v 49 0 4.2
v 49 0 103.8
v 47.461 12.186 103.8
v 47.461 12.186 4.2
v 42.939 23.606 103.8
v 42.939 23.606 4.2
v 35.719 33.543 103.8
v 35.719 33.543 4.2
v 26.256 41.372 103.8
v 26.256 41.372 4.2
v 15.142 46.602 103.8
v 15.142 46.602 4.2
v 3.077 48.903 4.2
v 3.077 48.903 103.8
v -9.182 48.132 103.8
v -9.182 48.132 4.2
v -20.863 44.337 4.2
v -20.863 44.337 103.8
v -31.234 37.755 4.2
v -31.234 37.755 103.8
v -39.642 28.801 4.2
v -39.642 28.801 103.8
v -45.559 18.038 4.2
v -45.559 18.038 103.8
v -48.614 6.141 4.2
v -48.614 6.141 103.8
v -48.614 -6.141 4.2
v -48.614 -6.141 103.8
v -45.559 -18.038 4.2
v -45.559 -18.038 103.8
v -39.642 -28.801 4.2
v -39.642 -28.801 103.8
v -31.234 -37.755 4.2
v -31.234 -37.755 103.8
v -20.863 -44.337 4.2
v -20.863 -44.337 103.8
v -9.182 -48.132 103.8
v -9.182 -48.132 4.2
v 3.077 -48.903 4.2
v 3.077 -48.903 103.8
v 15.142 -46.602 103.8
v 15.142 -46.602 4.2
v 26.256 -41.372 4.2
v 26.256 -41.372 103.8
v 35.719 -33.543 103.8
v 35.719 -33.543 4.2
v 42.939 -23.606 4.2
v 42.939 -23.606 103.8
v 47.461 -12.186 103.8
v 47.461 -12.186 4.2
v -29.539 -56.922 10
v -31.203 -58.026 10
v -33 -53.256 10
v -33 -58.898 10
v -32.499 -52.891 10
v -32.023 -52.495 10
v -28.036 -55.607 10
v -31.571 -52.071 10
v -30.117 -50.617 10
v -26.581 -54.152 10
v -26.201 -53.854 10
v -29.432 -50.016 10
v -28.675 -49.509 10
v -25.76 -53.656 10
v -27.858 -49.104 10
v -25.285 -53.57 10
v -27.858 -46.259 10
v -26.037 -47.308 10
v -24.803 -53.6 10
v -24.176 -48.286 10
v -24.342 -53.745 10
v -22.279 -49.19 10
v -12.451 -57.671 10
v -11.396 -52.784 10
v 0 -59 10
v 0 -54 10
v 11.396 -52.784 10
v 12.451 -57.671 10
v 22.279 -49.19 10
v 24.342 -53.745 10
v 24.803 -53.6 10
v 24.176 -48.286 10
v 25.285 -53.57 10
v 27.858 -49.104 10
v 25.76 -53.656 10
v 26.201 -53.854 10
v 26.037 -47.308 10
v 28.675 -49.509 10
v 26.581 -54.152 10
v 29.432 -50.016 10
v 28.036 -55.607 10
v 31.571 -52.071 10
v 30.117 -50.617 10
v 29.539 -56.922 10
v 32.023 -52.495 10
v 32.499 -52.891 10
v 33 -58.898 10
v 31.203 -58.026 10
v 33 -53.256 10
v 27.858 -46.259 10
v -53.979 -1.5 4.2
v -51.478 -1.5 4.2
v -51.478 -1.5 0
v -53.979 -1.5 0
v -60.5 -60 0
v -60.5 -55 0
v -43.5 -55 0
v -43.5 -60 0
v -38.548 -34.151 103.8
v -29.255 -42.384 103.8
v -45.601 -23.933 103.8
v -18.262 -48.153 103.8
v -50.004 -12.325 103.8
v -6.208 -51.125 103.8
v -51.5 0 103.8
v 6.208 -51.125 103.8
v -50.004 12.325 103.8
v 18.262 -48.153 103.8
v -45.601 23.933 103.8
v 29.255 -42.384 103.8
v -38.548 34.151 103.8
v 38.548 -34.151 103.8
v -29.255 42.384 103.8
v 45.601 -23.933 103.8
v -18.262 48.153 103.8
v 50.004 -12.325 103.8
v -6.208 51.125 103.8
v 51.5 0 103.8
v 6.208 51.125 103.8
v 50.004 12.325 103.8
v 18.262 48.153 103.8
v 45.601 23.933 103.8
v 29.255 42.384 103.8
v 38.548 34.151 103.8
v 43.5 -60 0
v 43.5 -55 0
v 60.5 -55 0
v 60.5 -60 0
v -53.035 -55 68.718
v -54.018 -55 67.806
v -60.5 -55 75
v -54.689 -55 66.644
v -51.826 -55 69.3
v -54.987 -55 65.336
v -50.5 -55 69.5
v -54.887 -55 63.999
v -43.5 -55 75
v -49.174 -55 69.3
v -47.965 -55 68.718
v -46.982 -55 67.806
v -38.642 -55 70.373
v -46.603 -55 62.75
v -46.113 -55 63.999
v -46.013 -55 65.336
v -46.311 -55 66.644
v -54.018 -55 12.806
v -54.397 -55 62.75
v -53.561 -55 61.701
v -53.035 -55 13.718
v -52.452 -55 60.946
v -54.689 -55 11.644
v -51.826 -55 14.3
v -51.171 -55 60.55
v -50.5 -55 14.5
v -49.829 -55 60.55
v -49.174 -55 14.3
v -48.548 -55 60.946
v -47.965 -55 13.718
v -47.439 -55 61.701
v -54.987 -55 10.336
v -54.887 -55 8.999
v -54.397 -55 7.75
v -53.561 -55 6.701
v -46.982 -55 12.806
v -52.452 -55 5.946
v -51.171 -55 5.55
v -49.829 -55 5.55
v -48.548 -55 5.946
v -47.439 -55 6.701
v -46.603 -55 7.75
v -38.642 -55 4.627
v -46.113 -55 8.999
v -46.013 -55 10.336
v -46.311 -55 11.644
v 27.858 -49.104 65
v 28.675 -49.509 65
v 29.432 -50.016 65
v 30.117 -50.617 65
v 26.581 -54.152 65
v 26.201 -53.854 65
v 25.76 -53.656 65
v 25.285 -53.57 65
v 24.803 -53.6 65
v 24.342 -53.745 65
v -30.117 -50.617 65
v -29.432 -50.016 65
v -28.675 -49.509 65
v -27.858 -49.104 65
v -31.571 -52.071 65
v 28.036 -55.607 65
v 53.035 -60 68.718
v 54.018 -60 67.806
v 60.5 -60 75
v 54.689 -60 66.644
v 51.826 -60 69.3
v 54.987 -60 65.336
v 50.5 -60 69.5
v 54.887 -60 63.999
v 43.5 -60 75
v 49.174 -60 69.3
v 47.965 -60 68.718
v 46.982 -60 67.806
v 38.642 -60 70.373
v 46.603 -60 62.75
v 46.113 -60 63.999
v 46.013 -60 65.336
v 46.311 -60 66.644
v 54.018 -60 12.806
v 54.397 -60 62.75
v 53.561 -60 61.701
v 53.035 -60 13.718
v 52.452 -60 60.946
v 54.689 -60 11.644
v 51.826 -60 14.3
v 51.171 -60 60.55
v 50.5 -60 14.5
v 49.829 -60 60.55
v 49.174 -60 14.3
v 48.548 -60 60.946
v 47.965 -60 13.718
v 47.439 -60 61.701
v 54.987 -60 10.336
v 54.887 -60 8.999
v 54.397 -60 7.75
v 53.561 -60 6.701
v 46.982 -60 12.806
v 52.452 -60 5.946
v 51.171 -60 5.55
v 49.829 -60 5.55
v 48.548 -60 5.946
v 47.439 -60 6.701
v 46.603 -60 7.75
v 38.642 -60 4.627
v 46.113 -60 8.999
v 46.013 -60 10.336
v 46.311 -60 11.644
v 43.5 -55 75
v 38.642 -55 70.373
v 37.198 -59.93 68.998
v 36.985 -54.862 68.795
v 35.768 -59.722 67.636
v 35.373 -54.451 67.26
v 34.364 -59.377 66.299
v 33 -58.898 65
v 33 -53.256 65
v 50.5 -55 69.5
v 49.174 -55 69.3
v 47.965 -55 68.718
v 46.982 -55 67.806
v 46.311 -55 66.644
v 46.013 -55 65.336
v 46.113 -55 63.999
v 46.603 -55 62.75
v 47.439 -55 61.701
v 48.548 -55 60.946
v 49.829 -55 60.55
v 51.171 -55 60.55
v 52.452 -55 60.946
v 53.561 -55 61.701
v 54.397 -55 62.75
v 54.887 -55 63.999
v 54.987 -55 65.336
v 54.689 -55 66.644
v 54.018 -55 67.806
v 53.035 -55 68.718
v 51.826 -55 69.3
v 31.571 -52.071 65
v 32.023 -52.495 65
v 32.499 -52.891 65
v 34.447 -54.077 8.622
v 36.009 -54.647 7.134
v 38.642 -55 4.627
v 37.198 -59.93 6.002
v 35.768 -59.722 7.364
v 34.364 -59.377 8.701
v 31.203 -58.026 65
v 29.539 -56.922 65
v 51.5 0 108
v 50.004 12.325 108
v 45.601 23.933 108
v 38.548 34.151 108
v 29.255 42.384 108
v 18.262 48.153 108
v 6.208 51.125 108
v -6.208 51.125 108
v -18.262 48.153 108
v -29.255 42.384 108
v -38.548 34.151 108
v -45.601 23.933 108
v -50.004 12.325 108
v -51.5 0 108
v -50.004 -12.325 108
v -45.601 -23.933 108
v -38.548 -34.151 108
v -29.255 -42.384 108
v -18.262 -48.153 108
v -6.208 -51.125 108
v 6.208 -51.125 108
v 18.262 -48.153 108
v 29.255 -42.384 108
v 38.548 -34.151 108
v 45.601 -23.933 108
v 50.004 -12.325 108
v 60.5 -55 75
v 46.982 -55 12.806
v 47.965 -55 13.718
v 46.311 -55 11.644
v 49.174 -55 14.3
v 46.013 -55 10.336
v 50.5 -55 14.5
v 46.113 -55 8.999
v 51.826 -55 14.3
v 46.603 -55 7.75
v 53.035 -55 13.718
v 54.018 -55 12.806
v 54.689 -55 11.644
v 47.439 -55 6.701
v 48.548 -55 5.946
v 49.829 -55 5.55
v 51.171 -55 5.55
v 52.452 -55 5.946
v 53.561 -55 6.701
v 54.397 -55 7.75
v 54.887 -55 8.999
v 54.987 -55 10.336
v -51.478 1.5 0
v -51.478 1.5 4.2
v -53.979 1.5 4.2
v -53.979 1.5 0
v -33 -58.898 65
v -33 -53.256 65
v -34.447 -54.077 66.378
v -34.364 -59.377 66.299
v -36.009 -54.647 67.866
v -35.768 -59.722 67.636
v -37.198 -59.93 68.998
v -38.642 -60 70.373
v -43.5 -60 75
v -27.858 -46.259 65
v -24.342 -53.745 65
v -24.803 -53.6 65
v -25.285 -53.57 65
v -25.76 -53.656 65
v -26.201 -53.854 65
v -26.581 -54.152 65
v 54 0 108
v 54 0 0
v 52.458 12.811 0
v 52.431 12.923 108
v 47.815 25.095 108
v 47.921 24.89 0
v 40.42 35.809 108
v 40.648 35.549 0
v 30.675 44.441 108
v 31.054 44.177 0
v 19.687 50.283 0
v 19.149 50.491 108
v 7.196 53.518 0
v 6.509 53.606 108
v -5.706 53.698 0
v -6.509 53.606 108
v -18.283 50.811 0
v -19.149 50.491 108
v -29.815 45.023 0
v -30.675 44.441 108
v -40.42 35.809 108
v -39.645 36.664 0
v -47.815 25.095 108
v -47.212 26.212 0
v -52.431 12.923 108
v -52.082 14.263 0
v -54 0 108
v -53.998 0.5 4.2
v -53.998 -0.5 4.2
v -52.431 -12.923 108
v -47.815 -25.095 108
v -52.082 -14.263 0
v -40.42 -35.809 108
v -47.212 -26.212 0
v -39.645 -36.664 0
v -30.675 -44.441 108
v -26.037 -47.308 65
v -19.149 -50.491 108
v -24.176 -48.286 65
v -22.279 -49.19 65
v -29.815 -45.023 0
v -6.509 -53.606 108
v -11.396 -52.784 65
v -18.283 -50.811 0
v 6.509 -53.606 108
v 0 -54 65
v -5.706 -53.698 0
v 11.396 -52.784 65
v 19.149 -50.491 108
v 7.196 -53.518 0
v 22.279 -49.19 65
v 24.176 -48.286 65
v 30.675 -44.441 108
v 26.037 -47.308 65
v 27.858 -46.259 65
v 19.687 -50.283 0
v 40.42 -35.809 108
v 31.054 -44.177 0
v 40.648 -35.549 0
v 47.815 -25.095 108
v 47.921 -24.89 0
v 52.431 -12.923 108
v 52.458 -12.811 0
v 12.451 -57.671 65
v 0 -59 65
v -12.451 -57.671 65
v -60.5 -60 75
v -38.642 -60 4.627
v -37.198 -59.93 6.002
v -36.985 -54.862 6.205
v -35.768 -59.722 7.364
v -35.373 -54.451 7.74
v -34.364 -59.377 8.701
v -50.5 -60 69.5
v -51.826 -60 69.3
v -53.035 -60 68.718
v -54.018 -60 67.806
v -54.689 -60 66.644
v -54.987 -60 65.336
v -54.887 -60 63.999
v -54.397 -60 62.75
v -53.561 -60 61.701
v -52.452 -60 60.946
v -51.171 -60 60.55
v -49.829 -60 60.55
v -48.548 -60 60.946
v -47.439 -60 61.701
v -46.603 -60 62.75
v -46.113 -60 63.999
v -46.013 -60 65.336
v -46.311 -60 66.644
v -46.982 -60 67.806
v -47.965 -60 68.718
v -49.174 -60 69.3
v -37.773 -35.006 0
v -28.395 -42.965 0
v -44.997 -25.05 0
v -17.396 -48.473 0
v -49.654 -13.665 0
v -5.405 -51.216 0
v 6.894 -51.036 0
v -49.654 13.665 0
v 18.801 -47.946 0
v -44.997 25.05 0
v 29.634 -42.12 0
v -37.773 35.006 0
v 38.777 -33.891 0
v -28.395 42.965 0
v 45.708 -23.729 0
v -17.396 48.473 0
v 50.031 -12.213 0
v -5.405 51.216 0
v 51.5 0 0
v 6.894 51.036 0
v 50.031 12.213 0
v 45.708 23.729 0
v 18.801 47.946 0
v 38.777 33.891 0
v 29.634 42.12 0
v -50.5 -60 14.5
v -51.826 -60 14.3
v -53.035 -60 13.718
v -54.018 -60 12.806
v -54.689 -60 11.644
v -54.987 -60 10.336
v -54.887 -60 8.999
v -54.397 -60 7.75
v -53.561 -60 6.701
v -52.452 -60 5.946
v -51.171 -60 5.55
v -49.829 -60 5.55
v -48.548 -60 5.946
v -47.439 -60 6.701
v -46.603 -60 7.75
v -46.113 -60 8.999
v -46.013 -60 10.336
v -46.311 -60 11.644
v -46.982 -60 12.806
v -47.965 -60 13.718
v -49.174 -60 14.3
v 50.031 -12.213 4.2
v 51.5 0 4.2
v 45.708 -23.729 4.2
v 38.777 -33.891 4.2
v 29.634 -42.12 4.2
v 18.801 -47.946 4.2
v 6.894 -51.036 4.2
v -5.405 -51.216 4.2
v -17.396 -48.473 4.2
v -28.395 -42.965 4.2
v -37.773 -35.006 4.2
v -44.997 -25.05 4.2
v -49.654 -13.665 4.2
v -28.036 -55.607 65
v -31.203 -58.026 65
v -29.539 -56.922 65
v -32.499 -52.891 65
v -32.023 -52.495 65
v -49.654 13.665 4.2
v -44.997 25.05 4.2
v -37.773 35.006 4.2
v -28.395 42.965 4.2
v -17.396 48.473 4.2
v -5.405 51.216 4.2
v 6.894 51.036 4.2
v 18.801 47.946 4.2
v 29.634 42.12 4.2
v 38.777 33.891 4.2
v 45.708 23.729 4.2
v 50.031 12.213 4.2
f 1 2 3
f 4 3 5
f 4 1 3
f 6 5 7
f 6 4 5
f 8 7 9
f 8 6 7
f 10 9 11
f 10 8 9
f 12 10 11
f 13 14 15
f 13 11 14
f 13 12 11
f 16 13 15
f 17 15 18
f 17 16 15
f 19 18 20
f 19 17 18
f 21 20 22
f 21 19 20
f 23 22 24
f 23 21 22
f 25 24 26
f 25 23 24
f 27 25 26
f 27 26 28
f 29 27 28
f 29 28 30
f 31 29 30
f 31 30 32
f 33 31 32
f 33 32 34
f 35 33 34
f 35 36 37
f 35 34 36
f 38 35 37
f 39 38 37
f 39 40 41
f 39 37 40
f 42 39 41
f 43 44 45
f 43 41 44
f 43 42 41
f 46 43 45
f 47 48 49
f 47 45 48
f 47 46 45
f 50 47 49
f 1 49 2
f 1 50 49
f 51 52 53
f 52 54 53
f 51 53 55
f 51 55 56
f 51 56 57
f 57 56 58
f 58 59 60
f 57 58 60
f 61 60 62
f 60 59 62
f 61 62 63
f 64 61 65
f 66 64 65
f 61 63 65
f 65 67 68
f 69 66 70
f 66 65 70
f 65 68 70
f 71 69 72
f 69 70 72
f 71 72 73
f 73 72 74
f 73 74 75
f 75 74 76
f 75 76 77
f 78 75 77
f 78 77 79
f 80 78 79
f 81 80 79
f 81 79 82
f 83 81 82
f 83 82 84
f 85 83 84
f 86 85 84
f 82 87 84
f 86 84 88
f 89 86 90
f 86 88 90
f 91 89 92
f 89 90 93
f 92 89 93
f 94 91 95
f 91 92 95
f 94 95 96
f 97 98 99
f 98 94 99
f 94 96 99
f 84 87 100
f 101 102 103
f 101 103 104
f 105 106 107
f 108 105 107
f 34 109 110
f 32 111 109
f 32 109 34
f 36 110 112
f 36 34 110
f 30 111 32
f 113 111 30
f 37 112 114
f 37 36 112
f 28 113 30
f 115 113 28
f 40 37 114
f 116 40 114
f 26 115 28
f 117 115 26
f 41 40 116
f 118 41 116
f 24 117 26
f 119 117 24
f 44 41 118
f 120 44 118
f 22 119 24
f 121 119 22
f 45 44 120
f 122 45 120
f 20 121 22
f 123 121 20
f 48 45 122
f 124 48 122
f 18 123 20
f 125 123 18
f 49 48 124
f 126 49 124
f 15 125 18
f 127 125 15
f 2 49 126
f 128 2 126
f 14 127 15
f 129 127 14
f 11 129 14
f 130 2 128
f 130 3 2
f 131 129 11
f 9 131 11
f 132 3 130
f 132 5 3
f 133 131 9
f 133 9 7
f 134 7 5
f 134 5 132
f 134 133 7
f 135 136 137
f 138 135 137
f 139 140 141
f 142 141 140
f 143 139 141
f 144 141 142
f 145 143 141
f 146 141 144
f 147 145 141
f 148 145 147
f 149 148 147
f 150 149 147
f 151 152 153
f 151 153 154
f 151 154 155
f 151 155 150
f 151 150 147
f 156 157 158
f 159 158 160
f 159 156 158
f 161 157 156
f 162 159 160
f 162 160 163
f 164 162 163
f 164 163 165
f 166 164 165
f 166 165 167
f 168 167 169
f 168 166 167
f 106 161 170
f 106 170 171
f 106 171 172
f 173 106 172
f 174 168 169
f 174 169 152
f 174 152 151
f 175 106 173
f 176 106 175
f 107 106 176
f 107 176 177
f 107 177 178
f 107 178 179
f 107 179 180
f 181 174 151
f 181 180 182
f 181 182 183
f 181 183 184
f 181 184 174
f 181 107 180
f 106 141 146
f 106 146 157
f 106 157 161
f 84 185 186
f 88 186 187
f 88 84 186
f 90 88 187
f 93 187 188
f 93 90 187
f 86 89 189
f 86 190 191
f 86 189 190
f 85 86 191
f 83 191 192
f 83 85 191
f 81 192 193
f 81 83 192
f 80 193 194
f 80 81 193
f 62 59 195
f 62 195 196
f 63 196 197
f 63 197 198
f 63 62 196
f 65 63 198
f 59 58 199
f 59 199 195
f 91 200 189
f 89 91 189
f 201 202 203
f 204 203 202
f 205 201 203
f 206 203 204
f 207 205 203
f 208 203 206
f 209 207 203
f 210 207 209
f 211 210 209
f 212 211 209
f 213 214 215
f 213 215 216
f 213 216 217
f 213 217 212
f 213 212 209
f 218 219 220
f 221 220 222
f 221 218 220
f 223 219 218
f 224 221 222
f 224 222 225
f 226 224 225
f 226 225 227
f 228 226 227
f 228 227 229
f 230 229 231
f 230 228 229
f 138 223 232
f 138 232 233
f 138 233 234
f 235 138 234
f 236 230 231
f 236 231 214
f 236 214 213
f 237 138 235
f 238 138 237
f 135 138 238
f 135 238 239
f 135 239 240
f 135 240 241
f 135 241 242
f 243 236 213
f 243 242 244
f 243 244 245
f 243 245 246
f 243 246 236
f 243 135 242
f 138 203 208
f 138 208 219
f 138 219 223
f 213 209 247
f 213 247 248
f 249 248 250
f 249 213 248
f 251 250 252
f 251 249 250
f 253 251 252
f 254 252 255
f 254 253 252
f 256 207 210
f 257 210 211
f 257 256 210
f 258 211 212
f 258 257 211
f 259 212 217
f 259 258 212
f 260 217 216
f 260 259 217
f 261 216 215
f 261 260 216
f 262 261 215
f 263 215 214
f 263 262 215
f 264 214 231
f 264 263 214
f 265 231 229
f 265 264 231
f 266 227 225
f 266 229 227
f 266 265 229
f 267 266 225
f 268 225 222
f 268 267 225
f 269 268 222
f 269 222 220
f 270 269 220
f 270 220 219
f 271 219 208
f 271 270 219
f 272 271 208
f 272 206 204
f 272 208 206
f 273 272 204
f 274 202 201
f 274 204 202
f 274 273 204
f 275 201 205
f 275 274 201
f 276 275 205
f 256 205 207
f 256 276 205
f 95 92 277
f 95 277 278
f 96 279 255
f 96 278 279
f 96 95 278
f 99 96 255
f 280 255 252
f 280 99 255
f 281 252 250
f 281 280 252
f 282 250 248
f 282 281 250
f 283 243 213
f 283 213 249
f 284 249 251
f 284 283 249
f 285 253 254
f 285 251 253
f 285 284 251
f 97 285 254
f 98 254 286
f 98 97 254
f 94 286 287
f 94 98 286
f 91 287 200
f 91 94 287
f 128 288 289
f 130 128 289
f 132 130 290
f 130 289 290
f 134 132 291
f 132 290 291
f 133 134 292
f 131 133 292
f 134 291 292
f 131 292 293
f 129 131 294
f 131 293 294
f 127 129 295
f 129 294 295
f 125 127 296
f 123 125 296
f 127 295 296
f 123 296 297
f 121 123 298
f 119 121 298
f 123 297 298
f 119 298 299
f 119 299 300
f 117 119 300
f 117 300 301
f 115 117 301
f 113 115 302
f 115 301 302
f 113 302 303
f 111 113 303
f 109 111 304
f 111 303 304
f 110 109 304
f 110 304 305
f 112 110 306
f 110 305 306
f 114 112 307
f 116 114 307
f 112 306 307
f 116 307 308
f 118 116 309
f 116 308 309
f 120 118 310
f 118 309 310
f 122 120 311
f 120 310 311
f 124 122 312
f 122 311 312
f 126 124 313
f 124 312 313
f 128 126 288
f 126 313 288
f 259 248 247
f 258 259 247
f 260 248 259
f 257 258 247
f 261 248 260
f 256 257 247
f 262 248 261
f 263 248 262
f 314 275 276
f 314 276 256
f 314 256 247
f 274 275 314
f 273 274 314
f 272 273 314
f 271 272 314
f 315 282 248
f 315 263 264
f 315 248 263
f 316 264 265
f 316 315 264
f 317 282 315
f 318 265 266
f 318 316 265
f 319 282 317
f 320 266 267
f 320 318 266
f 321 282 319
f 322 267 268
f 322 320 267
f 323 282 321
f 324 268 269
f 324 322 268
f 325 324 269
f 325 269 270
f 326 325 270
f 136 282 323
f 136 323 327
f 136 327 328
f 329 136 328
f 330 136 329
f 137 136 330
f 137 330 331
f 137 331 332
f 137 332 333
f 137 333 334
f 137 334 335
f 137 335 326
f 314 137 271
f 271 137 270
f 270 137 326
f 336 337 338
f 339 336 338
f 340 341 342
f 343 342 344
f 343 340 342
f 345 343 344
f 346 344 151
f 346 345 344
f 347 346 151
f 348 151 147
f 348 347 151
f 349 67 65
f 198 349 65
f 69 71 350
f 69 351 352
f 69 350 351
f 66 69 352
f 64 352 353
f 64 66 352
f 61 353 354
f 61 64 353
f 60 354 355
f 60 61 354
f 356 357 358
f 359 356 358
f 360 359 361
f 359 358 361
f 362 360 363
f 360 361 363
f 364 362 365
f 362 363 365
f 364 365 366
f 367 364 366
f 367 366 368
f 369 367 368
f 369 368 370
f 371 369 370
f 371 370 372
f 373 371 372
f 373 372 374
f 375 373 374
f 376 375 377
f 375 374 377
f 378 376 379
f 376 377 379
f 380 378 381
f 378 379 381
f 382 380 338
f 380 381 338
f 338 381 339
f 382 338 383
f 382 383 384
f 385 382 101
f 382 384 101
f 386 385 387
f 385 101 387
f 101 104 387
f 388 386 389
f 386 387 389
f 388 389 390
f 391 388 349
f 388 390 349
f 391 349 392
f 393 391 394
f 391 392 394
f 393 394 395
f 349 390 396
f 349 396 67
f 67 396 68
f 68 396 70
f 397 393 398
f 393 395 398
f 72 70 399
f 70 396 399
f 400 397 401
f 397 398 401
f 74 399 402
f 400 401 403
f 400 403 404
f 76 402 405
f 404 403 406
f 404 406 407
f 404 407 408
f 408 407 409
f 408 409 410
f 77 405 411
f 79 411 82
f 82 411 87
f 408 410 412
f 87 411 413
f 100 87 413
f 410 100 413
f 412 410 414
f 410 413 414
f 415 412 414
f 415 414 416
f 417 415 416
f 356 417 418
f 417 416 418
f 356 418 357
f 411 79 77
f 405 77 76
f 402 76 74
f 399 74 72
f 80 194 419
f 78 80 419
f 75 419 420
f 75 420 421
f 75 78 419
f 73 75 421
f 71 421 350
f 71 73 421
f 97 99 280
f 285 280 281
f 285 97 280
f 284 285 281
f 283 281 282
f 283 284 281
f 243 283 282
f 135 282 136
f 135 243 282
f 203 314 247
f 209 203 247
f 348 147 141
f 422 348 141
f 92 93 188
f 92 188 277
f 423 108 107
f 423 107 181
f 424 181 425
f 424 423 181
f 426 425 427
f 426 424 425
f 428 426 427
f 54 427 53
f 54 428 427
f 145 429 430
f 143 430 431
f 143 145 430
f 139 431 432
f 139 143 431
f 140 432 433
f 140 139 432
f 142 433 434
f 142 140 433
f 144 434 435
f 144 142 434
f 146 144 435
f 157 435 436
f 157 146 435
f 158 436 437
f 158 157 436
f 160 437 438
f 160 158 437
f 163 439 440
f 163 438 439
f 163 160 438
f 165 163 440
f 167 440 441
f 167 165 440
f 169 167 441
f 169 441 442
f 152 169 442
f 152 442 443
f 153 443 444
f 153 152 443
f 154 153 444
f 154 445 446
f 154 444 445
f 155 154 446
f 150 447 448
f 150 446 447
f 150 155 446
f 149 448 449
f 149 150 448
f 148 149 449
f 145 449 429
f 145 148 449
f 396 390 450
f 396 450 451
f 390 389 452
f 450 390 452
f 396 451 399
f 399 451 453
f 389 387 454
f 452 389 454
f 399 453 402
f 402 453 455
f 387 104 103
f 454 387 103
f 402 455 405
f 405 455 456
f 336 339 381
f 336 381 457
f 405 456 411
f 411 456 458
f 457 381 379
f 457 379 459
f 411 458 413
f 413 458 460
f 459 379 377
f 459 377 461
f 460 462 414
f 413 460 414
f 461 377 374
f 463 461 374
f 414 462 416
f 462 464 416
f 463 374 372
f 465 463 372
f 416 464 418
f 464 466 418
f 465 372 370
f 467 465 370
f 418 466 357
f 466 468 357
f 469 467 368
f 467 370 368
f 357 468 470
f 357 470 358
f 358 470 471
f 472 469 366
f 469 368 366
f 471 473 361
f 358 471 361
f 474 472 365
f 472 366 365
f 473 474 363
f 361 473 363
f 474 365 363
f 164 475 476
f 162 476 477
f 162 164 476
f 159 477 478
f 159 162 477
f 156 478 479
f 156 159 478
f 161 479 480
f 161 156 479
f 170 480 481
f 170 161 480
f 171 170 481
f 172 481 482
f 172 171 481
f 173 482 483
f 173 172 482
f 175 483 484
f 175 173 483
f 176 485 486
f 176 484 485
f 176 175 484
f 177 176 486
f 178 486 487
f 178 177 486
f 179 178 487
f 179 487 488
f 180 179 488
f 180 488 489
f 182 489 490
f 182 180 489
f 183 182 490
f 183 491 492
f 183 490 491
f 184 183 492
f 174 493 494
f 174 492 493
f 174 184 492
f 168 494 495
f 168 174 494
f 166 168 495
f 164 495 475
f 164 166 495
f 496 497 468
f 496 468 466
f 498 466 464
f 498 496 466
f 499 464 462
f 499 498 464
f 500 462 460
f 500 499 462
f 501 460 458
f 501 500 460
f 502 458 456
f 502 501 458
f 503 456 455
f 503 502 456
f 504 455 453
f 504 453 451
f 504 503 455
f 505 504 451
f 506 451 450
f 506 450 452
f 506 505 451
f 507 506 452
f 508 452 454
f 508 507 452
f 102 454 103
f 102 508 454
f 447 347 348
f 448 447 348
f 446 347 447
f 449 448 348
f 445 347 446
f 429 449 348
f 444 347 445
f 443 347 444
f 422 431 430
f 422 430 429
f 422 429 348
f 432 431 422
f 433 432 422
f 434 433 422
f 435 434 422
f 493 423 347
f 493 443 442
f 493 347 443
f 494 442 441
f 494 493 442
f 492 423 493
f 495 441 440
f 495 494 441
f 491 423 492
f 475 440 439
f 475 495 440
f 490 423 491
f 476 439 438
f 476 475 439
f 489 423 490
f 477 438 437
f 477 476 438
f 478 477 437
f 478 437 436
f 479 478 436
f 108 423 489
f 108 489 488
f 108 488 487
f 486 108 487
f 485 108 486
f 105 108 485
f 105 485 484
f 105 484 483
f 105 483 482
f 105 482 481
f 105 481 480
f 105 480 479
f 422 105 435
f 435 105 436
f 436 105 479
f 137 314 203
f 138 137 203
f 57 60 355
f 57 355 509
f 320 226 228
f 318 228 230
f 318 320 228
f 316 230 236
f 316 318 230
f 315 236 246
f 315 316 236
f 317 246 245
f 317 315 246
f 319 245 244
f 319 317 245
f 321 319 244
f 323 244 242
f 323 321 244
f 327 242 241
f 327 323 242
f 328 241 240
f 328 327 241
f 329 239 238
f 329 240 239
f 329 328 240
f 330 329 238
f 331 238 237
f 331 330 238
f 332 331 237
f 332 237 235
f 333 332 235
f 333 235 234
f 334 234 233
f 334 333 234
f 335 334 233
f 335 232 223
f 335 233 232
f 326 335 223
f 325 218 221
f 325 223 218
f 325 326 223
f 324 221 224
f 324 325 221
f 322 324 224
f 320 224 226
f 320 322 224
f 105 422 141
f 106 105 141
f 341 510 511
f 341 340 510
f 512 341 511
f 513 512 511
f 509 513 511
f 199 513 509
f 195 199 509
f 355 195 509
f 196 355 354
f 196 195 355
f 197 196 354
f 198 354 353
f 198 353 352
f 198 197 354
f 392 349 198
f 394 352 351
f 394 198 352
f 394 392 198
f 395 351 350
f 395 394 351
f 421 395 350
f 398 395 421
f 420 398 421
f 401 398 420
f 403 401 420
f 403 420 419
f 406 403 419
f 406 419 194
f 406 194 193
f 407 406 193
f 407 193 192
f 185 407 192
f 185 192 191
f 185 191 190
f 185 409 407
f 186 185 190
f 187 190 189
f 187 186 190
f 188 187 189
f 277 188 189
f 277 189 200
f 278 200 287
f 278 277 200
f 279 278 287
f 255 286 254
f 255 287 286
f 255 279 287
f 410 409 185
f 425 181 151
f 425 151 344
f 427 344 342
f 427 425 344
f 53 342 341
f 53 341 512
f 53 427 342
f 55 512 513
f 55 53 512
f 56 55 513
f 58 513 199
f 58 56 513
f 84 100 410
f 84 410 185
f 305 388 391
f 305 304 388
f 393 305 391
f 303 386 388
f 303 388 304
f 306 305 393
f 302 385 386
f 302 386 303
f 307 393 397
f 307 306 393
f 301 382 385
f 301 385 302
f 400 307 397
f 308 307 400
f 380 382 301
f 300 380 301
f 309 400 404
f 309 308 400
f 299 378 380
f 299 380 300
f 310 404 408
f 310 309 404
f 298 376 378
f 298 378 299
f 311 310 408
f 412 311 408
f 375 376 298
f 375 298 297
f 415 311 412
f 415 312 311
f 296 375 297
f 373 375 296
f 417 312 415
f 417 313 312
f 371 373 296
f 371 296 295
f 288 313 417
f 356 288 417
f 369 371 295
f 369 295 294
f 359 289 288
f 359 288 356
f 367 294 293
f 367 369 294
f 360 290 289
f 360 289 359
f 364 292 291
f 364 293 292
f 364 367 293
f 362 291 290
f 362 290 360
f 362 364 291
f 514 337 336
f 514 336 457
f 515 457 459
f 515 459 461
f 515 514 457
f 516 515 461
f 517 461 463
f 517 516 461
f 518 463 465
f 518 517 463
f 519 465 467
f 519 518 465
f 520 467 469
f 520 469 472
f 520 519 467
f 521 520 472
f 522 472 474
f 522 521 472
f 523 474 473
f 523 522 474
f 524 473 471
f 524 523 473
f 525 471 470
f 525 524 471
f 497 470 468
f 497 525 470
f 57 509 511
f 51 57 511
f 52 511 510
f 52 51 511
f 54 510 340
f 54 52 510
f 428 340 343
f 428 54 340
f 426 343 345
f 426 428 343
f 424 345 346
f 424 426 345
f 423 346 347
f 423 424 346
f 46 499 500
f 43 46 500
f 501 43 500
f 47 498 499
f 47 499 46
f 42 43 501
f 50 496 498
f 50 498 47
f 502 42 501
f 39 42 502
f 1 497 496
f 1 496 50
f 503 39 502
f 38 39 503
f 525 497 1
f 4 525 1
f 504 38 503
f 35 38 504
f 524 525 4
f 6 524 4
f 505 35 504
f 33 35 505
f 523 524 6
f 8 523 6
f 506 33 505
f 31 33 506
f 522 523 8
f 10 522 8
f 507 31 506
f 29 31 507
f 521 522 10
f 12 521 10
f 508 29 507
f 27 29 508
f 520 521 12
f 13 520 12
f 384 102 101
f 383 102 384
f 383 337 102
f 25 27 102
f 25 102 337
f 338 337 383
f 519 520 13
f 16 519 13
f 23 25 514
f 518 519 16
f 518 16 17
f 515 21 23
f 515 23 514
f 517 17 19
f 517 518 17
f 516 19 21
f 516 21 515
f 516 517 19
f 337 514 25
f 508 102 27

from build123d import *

# Parameters (mm, degrees)
ESQUISSE1_R                     = 54
ESQUISSE1_R_2                   = 49
EXTRUSION1_DEPTH                = 108
ESQUISSE2_R                     = 51.5
ENL_V_MAT_EXTRU_1_DEPTH         = 4.2
ENL_V_START                     = -4.2
ESQUISSE3_R                     = 51.5
ENL_V_MAT_EXTRU_2_DEPTH         = 4.2
ESQUISSE4_W                     = 13.403361345
ESQUISSE4_H                     = 3
ENL_V_MAT_EXTRU_3_DEPTH         = 4.2
EXTRUSION2_DEPTH                = 75
ENL_V_MAT_EXTRU_4_REACH         = 170.286
ENL_V_MAT_EXTRU_4_END_RADIUS    = 54
EXTRUSION3_DEPTH                = 55
R_P_TITION_LIN_AIRE1_COUNT      = 2
R_P_TITION_LIN_AIRE1_PITCH      = 55
R_P_TITION_LIN_AIRE1_COUNT_DIR2 = 2
R_P_TITION_LIN_AIRE1_PITCH_DIR2 = 101


with BuildPart() as part:
    # Esquisse1 → Extrusion1 (new body)
    with BuildSketch(Plane.XY):
        Circle(ESQUISSE1_R)
        Circle(ESQUISSE1_R_2, mode=Mode.SUBTRACT)
    extrude(amount=EXTRUSION1_DEPTH)

    # Esquisse2 → Enlèv. mat.-Extru.1 (cut)
    with BuildSketch(Plane.XY.offset(108)):
        Circle(ESQUISSE2_R)
    extrude(amount=-ENL_V_MAT_EXTRU_1_DEPTH, mode=Mode.SUBTRACT)

    # Esquisse3 → Enlèv. mat.-Extru.2 (cut)
    with BuildSketch(Plane(origin=(0, 0, 0), x_dir=(-1, 0, 0), z_dir=(0, 0, -1)).offset(ENL_V_START)):
        with Locations(Location((0, 0, 0), (0, 0, 180))):
            Circle(ESQUISSE3_R)
    extrude(amount=ENL_V_MAT_EXTRU_2_DEPTH, mode=Mode.SUBTRACT)

    # Esquisse4 → Enlèv. mat.-Extru.3 (cut)
    with BuildSketch(Plane(origin=(0, 0, 0), x_dir=(-1, 0, 0), z_dir=(0, 0, -1))):
        with Locations((51.37955182, 0)):
            Rectangle(ESQUISSE4_W, ESQUISSE4_H)
    extrude(amount=-ENL_V_MAT_EXTRU_3_DEPTH, mode=Mode.SUBTRACT)

    # Esquisse5 → Extrusion2 (add)
    with BuildSketch(Plane(origin=(0, 0, 0), x_dir=(-1, 0, 0), z_dir=(0, 0, -1))):
        with BuildLine():
            Line((-60.5, -60), (-38.642135624, -60))
            ThreePointArc((-38.642135624, -60), (-32.901884138, -58.858192988), (-28.035533906, -55.606601718))
            Line((-28.035533906, -55.606601718), (-26.581131511, -54.152199323))
            ThreePointArc((-26.581131511, -54.152199323), (-25.525097055, -53.598747333), (-24.341773098, -53.744563283))
            ThreePointArc((-24.341773098, -53.744563283), (0, -59), (24.341773098, -53.744563283))
            ThreePointArc((24.341773098, -53.744563283), (25.525097055, -53.598747333), (26.581131511, -54.152199323))
            Line((26.581131511, -54.152199323), (28.035533906, -55.606601718))
            ThreePointArc((28.035533906, -55.606601718), (32.901884138, -58.858192988), (38.642135624, -60))
            Line((38.642135624, -60), (60.5, -60))
            Line((60.5, -60), (60.5, -55))
            Line((60.5, -55), (38.642135624, -55))
            ThreePointArc((38.642135624, -55), (34.8153013, -54.238795325), (31.571067812, -52.071067812))
            Line((31.571067812, -52.071067812), (30.116665417, -50.616665417))
            ThreePointArc((30.116665417, -50.616665417), (26.42054482, -48.67958345), (22.278910971, -49.189939276))
            ThreePointArc((22.278910971, -49.189939276), (0, -54), (-22.278910971, -49.189939276))
            ThreePointArc((-22.278910971, -49.189939276), (-26.42054482, -48.67958345), (-30.116665417, -50.616665417))
            Line((-30.116665417, -50.616665417), (-31.571067812, -52.071067812))
            ThreePointArc((-31.571067812, -52.071067812), (-34.8153013, -54.238795325), (-38.642135624, -55))
            Line((-38.642135624, -55), (-60.5, -55))
            Line((-60.5, -55), (-60.5, -60))
        make_face()
    extrude(amount=-EXTRUSION2_DEPTH)

    # Enlèv. mat.-Extru.4: up to this cylinder (the profile starts outside it)
    enl_v_mat_extru_4_end = Plane(origin=(0, 0, 37.5), z_dir=(0, 0, -1)) * Cylinder(ENL_V_MAT_EXTRU_4_END_RADIUS, 515.029516, mode=Mode.PRIVATE)
    # Esquisse6 → Enlèv. mat.-Extru.4 (cut, up to the surface)
    with BuildSketch(Plane.XZ.offset(60), mode=Mode.PRIVATE) as enl_v_mat_extru_4_sk1:
        Polygon((43.5, 0), (-43.5, 0), (-33, 10), (33, 10), align=None)
    enl_v_mat_extru_4_tool1 = extrude(enl_v_mat_extru_4_sk1.sketch, amount=-ENL_V_MAT_EXTRU_4_REACH, mode=Mode.PRIVATE) - enl_v_mat_extru_4_end
    add(enl_v_mat_extru_4_tool1.solids().sort_by_distance((0, -60, 4.771242))[0], mode=Mode.SUBTRACT)
    # Esquisse6 → Enlèv. mat.-Extru.4 (cut, up to the surface)
    with BuildSketch(Plane.XZ.offset(60), mode=Mode.PRIVATE) as enl_v_mat_extru_4_sk2:
        Polygon((-33, 65), (-43.5, 75), (43.5, 75), (33, 65), align=None)
    enl_v_mat_extru_4_tool2 = extrude(enl_v_mat_extru_4_sk2.sketch, amount=-ENL_V_MAT_EXTRU_4_REACH, mode=Mode.PRIVATE) - enl_v_mat_extru_4_end
    add(enl_v_mat_extru_4_tool2.solids().sort_by_distance((0, -60, 70.228758))[0], mode=Mode.SUBTRACT)

    # Esquisse7 → Extrusion3 (add)
    with BuildSketch(Plane(origin=(0, 0, 10), x_dir=(-1, 0, 0), z_dir=(0, 0, -1))):
        with BuildLine():
            Line((27.857974208, -46.259412804), (27.857974208, -49.104353136))
            ThreePointArc((27.857974208, -49.104353136), (25.059546429, -48.567236408), (22.278910971, -49.189939276))
            ThreePointArc((22.278910971, -49.189939276), (25.111228768, -47.806131299), (27.857974208, -46.259412804))
        make_face()
        with BuildLine():
            Line((-27.857974208, -46.259412804), (-27.857974208, -49.104353136))
            ThreePointArc((-27.857974208, -49.104353136), (-25.059546429, -48.567236408), (-22.278910971, -49.189939276))
            ThreePointArc((-22.278910971, -49.189939276), (-25.111228768, -47.806131299), (-27.857974208, -46.259412804))
        make_face()
    extrude(amount=-EXTRUSION3_DEPTH)

    # Esquisse10 → Dégagement M81 (revolve, cut)
    with BuildSketch(Plane(origin=(50.5, -55, 10), x_dir=(0, 0, 1), z_dir=(1, 0, 0))):
        Polygon((0, 0), (0, 26.703872786), (4.5, 24), (4.5, 0), align=None)
    d_gagement_m81 = revolve(axis=Axis((50.5, -48.65, 10), (0, -1, 0)), mode=Mode.SUBTRACT)

    # Répétition linéaire1: D_gagement M81 2 × 2
    with Locations(*[(-j * R_P_TITION_LIN_AIRE1_PITCH_DIR2, 0, i * R_P_TITION_LIN_AIRE1_PITCH) for i in range(R_P_TITION_LIN_AIRE1_COUNT) for j in range(R_P_TITION_LIN_AIRE1_COUNT_DIR2) if (i, j) != (0, 0)]):
        add(d_gagement_m81, mode=Mode.SUBTRACT)


solid = part.part
